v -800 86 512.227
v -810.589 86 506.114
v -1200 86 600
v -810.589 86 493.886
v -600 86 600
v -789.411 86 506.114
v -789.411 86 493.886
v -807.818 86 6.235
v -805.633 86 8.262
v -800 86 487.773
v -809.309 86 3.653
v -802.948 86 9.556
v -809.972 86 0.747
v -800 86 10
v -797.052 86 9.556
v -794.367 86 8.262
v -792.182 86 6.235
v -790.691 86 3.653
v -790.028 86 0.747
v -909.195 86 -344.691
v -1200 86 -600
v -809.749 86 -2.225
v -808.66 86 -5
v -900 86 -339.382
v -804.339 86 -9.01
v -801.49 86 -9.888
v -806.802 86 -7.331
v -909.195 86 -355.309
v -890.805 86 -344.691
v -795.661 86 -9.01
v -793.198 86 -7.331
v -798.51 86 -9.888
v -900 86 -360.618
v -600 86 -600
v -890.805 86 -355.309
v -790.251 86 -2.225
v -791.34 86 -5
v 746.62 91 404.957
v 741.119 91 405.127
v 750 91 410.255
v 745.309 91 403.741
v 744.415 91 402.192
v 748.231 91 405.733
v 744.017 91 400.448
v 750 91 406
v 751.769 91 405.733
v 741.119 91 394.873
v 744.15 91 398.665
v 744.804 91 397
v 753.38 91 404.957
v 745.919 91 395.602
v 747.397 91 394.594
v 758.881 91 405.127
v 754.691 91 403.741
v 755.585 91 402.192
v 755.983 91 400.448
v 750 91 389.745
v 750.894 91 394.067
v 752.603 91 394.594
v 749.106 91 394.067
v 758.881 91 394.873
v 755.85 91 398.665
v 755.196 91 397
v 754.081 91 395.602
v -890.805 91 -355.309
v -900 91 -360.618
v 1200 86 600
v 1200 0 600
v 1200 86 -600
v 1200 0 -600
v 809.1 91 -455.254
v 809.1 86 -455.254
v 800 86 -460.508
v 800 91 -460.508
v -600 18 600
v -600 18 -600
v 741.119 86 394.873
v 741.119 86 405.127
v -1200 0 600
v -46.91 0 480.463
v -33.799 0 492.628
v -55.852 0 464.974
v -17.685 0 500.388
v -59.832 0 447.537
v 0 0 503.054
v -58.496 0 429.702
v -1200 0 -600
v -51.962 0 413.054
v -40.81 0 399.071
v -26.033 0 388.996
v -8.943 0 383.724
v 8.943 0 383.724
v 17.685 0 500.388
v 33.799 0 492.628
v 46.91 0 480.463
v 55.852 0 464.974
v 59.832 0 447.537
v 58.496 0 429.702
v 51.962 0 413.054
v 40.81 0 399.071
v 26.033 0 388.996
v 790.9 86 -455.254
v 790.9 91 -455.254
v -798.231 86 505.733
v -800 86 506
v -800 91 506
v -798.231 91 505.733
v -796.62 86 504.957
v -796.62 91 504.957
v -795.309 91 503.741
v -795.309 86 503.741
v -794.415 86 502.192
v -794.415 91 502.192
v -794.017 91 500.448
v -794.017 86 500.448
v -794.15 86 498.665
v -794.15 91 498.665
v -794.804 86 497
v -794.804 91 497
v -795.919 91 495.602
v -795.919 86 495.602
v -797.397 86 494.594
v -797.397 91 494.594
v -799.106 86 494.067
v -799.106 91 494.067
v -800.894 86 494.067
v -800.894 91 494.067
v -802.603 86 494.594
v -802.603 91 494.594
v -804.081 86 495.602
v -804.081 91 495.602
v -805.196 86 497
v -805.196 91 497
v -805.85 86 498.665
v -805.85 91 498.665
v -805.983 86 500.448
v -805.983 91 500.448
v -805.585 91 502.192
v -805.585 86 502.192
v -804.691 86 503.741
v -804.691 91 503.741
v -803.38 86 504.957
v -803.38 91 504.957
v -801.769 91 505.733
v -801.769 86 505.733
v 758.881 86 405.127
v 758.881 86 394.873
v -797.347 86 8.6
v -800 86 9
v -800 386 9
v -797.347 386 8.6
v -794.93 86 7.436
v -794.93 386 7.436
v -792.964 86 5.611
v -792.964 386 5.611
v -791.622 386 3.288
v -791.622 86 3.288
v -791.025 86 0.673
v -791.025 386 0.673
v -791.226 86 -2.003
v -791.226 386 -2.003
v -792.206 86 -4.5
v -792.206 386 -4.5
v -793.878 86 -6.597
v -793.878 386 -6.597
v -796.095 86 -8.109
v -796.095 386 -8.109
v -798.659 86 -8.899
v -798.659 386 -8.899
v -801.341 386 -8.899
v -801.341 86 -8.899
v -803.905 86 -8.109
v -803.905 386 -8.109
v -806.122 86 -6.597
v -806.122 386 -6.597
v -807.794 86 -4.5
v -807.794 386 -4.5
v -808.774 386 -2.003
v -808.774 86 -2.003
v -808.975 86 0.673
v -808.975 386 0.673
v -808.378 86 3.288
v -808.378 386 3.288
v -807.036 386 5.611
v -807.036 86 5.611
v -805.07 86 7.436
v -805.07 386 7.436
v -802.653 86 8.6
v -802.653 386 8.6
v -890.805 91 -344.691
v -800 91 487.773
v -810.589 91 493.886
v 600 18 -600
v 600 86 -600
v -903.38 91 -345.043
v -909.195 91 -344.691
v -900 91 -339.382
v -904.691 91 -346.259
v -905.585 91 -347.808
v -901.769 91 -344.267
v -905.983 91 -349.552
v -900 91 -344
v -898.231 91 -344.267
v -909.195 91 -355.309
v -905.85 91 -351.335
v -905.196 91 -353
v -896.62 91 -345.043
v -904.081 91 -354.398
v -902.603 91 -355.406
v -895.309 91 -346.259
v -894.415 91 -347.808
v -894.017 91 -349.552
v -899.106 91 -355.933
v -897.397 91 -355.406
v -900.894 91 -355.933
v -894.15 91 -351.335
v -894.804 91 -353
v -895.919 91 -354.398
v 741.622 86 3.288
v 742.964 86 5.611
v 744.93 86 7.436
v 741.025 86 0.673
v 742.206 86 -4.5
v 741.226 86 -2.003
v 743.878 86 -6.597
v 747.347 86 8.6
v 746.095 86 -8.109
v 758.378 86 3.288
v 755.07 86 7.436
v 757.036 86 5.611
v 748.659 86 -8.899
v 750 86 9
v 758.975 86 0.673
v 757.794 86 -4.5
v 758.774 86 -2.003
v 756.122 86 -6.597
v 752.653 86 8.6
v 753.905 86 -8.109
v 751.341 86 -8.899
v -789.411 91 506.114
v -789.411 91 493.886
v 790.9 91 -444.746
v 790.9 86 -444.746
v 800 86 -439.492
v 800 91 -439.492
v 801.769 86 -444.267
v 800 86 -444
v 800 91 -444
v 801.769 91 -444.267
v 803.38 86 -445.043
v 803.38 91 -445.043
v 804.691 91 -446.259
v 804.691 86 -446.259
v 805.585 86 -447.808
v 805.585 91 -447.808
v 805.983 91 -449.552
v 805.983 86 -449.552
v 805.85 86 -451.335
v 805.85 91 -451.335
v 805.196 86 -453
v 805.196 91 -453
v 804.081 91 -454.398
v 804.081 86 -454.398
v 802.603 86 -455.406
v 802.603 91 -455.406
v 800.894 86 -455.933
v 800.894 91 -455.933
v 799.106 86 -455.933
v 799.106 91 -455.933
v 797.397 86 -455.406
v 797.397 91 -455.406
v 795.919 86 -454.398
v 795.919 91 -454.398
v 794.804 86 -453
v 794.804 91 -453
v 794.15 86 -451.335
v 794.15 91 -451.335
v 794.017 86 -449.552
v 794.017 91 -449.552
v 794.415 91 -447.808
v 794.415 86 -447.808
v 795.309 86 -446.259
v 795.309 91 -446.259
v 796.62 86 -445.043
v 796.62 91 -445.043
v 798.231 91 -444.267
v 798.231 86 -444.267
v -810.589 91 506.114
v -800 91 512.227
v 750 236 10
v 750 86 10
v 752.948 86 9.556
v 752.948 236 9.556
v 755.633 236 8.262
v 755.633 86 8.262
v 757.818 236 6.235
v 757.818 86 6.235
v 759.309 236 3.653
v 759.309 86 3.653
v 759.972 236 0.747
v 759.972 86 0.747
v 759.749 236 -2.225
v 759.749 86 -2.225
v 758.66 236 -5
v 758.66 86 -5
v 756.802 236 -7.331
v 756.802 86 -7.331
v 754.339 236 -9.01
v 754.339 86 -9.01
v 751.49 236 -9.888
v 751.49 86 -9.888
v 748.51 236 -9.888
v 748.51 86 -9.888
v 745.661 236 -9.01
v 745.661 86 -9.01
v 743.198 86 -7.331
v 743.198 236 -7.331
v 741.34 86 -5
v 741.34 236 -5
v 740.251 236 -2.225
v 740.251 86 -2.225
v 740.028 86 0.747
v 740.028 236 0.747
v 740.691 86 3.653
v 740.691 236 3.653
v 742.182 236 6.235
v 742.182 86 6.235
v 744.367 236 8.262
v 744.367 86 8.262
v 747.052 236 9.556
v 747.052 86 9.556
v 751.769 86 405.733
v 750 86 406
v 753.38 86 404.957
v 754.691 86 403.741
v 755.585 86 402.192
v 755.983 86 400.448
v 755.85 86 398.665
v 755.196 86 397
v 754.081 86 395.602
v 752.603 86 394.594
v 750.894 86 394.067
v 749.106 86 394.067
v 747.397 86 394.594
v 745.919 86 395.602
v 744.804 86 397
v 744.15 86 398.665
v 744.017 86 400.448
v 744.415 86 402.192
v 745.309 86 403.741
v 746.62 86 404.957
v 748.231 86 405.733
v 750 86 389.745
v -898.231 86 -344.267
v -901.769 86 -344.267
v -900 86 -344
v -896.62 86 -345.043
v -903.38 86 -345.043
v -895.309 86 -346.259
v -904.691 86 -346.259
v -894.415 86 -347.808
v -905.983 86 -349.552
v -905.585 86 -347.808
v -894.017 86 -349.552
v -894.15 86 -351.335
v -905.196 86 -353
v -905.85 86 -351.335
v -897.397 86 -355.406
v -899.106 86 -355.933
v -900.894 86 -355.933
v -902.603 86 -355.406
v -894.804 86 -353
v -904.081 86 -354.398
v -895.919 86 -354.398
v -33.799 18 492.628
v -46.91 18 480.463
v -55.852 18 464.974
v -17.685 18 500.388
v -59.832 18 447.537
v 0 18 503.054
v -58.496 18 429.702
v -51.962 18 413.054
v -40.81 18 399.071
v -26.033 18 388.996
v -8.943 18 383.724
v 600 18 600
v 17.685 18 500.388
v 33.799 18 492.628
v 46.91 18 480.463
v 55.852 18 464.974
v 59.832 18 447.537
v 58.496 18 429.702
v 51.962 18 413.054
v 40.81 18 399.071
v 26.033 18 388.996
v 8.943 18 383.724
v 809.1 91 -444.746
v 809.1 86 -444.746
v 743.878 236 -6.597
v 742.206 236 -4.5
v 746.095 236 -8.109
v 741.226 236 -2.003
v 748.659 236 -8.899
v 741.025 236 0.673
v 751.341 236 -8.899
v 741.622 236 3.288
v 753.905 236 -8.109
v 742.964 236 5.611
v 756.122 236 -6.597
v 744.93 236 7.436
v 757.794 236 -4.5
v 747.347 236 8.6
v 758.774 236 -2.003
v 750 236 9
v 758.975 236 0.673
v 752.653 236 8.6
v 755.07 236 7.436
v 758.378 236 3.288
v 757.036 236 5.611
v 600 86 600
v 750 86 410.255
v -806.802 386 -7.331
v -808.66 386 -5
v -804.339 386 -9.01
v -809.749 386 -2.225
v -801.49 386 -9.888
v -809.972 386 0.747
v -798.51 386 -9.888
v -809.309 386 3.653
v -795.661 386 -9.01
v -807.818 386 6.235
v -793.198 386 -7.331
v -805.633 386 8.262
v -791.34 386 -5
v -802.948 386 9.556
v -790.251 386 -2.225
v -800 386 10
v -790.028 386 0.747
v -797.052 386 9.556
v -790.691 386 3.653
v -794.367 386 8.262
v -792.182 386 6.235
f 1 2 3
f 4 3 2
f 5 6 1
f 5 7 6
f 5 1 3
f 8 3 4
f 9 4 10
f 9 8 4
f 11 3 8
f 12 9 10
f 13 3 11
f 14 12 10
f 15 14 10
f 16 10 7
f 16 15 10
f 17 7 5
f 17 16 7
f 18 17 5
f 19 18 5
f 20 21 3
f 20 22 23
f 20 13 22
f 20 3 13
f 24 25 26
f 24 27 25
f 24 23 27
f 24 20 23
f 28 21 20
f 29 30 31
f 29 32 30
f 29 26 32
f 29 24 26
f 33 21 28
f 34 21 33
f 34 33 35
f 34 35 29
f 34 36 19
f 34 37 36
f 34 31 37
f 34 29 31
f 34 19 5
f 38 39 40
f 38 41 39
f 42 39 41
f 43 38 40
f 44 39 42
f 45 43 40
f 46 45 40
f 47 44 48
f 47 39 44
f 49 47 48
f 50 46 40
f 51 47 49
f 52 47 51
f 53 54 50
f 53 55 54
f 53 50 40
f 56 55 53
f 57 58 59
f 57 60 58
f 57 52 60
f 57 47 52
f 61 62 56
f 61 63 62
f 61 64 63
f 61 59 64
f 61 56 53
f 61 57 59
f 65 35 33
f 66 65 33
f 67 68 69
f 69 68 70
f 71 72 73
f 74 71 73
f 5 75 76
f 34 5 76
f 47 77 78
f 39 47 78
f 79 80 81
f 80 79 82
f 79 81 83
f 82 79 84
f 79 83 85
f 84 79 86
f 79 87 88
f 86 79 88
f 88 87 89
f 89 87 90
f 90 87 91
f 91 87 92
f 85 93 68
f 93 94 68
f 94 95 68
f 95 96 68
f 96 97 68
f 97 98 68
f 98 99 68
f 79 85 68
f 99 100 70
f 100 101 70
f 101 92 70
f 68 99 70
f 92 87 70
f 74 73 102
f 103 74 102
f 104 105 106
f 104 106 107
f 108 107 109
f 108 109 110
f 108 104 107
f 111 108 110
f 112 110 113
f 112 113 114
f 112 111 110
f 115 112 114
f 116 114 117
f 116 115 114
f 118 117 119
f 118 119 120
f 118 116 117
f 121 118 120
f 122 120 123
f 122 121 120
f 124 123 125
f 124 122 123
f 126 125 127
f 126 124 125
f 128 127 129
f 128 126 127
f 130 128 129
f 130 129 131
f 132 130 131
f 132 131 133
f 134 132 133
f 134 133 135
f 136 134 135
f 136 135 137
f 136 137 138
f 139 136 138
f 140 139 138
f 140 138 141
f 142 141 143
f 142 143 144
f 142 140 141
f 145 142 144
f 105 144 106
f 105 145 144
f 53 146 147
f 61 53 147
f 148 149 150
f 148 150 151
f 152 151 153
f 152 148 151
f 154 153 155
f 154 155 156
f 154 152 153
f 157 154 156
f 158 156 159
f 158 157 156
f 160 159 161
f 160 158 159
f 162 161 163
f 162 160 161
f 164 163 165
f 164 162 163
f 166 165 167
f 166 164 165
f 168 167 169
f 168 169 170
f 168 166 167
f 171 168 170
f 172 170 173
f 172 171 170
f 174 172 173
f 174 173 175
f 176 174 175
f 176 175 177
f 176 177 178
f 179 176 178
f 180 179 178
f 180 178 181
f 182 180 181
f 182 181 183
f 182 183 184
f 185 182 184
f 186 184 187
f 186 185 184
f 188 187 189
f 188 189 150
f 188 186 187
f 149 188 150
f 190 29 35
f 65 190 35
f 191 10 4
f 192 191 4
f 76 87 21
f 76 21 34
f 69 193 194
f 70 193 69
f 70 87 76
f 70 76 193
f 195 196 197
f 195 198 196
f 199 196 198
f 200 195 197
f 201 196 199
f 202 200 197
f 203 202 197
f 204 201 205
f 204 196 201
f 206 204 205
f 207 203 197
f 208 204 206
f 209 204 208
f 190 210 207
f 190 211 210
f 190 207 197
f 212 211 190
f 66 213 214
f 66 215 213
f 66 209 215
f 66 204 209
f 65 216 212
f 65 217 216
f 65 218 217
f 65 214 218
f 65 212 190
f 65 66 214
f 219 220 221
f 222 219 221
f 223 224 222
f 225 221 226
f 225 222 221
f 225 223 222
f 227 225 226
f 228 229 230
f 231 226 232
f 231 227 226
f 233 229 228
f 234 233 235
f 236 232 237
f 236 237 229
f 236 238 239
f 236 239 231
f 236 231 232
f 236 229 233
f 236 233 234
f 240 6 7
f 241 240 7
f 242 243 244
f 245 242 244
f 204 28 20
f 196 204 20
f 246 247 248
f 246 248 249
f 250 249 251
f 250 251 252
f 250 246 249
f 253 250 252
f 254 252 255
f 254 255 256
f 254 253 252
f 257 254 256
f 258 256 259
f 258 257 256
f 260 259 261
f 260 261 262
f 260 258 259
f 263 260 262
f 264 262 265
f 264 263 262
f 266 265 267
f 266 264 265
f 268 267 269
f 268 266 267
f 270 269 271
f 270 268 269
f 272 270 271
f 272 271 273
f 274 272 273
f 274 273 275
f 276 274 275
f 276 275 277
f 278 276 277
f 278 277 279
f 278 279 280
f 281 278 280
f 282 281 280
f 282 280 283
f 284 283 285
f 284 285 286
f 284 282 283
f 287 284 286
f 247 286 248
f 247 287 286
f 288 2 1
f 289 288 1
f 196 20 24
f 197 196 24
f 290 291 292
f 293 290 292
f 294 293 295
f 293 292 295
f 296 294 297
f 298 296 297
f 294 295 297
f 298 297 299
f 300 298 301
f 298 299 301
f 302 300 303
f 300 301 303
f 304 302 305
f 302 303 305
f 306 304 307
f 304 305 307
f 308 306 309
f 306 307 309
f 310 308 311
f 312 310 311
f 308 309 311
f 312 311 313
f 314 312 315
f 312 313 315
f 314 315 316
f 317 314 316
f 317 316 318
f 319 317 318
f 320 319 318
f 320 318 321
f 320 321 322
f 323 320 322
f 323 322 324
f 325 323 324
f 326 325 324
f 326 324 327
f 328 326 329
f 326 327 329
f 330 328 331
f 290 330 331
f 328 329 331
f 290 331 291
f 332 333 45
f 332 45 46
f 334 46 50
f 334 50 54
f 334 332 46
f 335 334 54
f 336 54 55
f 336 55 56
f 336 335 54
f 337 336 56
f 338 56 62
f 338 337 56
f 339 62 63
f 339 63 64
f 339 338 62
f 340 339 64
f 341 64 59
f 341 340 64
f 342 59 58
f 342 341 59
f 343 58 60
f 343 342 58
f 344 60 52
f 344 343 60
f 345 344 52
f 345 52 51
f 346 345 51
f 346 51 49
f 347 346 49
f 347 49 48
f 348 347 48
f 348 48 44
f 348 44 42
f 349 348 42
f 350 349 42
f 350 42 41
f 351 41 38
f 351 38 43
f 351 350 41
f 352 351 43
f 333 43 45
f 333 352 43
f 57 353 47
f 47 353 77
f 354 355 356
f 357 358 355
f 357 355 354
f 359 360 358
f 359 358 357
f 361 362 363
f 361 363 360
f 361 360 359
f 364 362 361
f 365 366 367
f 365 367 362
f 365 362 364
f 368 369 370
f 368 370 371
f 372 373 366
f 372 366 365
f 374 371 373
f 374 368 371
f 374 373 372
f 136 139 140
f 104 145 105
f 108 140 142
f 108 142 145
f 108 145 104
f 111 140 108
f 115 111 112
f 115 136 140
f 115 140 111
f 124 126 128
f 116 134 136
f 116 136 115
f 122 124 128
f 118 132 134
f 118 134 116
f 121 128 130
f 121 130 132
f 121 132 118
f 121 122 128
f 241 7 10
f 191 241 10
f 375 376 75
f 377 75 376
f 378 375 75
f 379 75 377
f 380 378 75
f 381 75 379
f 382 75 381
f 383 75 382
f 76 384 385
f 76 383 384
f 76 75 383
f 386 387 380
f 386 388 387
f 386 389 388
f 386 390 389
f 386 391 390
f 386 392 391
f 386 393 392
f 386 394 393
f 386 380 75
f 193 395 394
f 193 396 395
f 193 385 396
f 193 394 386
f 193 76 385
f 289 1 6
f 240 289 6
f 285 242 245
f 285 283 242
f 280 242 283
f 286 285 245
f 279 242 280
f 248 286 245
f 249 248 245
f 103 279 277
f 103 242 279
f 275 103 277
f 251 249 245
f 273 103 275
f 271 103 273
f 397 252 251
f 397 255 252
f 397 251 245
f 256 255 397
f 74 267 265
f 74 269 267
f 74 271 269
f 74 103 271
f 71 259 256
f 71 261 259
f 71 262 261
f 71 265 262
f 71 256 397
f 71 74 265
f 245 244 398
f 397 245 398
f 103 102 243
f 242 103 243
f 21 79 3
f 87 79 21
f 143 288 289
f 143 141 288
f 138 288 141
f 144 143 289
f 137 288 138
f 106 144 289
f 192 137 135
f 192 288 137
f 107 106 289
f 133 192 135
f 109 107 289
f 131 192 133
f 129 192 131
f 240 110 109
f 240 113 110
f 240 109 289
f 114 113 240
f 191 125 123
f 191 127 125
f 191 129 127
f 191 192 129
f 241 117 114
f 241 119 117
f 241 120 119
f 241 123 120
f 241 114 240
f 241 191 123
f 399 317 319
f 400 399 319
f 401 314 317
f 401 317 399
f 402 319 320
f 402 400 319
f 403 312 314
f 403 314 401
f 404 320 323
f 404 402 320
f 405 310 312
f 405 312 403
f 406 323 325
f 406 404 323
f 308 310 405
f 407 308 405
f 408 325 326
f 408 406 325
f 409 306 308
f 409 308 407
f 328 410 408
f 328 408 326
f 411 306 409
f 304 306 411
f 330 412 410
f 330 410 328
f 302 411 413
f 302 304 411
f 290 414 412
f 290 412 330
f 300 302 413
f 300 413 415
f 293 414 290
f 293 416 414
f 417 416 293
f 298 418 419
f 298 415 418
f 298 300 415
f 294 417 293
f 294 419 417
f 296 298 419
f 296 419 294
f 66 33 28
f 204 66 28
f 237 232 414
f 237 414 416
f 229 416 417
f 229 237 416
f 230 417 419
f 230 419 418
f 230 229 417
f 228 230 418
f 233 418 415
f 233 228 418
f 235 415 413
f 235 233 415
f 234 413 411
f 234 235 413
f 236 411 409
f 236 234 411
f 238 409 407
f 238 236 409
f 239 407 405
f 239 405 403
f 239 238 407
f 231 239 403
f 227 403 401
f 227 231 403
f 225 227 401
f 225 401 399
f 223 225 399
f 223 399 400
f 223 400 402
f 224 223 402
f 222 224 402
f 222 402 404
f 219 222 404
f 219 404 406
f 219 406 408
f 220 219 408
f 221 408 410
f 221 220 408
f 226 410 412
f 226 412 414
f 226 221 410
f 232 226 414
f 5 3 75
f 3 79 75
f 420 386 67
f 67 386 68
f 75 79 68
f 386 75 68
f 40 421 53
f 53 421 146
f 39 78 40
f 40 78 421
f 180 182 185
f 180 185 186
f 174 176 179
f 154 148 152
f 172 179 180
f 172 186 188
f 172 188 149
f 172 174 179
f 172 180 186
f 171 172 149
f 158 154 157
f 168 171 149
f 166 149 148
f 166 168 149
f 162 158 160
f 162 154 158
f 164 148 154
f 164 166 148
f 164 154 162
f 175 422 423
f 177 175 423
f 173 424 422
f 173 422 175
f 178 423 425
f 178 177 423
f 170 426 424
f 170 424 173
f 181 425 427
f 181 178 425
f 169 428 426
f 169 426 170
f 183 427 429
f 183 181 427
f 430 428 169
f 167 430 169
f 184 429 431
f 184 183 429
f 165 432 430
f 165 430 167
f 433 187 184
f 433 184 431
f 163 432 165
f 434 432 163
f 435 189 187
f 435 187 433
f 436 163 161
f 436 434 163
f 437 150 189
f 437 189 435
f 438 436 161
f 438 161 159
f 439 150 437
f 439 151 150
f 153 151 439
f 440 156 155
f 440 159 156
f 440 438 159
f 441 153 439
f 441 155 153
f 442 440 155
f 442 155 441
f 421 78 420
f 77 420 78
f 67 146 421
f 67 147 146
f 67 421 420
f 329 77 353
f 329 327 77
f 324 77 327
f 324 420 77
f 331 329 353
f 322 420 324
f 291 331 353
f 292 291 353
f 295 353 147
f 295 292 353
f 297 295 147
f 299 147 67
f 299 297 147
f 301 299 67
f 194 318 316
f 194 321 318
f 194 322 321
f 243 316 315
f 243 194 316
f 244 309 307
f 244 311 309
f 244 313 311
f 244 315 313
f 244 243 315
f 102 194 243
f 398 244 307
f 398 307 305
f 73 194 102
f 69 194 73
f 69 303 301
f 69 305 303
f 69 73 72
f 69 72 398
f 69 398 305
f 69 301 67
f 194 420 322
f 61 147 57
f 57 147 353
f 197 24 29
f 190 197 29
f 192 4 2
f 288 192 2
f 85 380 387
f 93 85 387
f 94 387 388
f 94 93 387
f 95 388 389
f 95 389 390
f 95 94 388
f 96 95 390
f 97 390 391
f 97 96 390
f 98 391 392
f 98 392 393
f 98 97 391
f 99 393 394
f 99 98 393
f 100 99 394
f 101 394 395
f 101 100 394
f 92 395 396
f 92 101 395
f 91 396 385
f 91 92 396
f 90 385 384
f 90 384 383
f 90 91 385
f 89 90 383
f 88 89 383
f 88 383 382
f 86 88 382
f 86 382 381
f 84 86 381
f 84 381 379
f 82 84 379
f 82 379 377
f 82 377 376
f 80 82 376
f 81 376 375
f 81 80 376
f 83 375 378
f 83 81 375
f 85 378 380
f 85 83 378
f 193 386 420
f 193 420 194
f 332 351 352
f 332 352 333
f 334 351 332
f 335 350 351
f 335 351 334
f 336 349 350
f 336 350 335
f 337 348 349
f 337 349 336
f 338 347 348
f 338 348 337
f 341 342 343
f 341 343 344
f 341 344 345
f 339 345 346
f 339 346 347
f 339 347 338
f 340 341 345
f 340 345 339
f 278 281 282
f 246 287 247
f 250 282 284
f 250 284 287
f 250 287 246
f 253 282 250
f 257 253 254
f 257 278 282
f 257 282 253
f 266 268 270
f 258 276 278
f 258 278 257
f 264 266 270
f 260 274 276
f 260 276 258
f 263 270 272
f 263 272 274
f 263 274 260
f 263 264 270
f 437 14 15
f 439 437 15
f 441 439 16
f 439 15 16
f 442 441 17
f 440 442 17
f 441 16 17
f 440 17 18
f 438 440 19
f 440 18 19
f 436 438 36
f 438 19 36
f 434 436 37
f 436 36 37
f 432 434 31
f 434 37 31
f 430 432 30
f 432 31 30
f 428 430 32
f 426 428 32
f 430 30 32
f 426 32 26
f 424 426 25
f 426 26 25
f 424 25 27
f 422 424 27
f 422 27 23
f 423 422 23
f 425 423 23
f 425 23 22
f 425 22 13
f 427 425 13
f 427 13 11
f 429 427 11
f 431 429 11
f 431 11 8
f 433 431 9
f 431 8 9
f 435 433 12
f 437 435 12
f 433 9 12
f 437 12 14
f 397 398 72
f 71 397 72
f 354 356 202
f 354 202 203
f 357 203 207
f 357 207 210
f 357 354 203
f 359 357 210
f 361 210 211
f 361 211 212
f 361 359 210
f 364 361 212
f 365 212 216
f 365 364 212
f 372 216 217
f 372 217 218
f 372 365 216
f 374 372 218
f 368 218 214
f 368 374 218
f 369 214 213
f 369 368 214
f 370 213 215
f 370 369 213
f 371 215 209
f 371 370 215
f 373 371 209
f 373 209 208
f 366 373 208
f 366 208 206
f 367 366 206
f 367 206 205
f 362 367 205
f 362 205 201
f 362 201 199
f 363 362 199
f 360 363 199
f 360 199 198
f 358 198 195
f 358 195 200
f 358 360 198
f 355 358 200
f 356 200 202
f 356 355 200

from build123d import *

# Parameters (mm, degrees)
SKETCH1_W           = 2400
SKETCH1_H           = 1200
SKETCH1_R           = 60
BOSS_EXTRUDE1_DEPTH = 18
BOSS_EXTRUDE2_START = 18
SKETCH2_W           = 600
SKETCH2_H           = 1200
BOSS_EXTRUDE2_DEPTH = 68
SKETCH3_R           = 10
SKETCH3_R_2         = 9
BOSS_EXTRUDE3_DEPTH = 300
SKETCH4_R           = 10
SKETCH4_R_2         = 9
BOSS_EXTRUDE4_DEPTH = 150
SKETCH6_R           = 6
BOSS_EXTRUDE5_DEPTH = 5
SKETCH7_R           = 6
BOSS_EXTRUDE6_DEPTH = 5


with BuildPart() as part:
    # Sketch1 → Boss-Extrude1 (new body)
    with BuildSketch(Plane(origin=(0, 0, 0), x_dir=(1, 0, 0), z_dir=(0, 1, 0))):
        Rectangle(SKETCH1_W, SKETCH1_H)
        with Locations(Location((0, -443.053648657, 0), (0, 0, 270))):
            Circle(SKETCH1_R, mode=Mode.SUBTRACT)
    extrude(amount=BOSS_EXTRUDE1_DEPTH)

    # Sketch2 → Boss-Extrude2 (add)
    with BuildSketch(Plane(origin=(0, 0, 0), x_dir=(1, 0, 0), z_dir=(0, 1, 0)).offset(BOSS_EXTRUDE2_START)):
        with Locations((-900, 0)):
            Rectangle(SKETCH2_W, SKETCH2_H)
        with Locations((900, 0)):
            Rectangle(SKETCH2_W, SKETCH2_H)
    extrude(amount=BOSS_EXTRUDE2_DEPTH)

    # Sketch3 → Boss-Extrude3 (add)
    with BuildSketch(Plane(origin=(0, 86, 0), x_dir=(1, 0, 0), z_dir=(0, 1, 0))):
        with Locations(Location((-800, 0, 0), (0, 0, 270))):
            Circle(SKETCH3_R)
        with Locations(Location((-800, 0, 0), (0, 0, 270))):
            Circle(SKETCH3_R_2, mode=Mode.SUBTRACT)
    extrude(amount=BOSS_EXTRUDE3_DEPTH)

    # Sketch4 → Boss-Extrude4 (add)
    with BuildSketch(Plane(origin=(0, 86, 0), x_dir=(1, 0, 0), z_dir=(0, 1, 0))):
        with Locations(Location((750, 0, 0), (0, 0, 270))):
            Circle(SKETCH4_R)
        with Locations(Location((750, 0, 0), (0, 0, 270))):
            Circle(SKETCH4_R_2, mode=Mode.SUBTRACT)
    extrude(amount=BOSS_EXTRUDE4_DEPTH)

    # Sketch6 → Boss-Extrude5 (add)
    # profile 1 of 2: a face of its own
    with BuildSketch(Plane(origin=(0, 86, 0), x_dir=(1, 0, 0), z_dir=(0, 1, 0))):
        Polygon((-800, -512.227333668), (-789.410818423, -506.113666834), (-789.410818423, -493.886333166), (-800, -487.772666332), (-810.589181577, -493.886333166), (-810.589181577, -506.113666834), align=None)
        with Locations(Location((-800, -500, 0), (0, 0, 270))):
            Circle(SKETCH6_R, mode=Mode.SUBTRACT)
    # profile 2 of 2: a face of its own
    with BuildSketch(Plane(origin=(0, 86, 0), x_dir=(1, 0, 0), z_dir=(0, 1, 0))):
        Polygon((-900, 360.617779526), (-909.195266801, 355.308889763), (-909.195266801, 344.691110237), (-900, 339.382220474), (-890.804733199, 344.691110237), (-890.804733199, 355.308889763), align=None)
        with Locations(Location((-900, 350, 0), (0, 0, 270))):
            Circle(SKETCH6_R, mode=Mode.SUBTRACT)
    extrude(amount=BOSS_EXTRUDE5_DEPTH)

    # Sketch7 → Boss-Extrude6 (add)
    # profile 1 of 2: a face of its own
    with BuildSketch(Plane(origin=(0, 86, 0), x_dir=(1, 0, 0), z_dir=(0, 1, 0))):
        Polygon((750, -410.254981665), (758.881074637, -405.127490833), (758.881074637, -394.872509167), (750, -389.745018335), (741.118925363, -394.872509167), (741.118925363, -405.127490833), align=None)
        with Locations(Location((750, -400, 0), (0, 0, 270))):
            Circle(SKETCH7_R, mode=Mode.SUBTRACT)
    # profile 2 of 2: a face of its own
    with BuildSketch(Plane(origin=(0, 86, 0), x_dir=(1, 0, 0), z_dir=(0, 1, 0))):
        Polygon((800, 460.50831519), (790.899532094, 455.254157595), (790.899532094, 444.745842405), (800, 439.49168481), (809.100467906, 444.745842405), (809.100467906, 455.254157595), align=None)
        with Locations(Location((800, 450, 0), (0, 0, 270))):
            Circle(SKETCH7_R, mode=Mode.SUBTRACT)
    extrude(amount=BOSS_EXTRUDE6_DEPTH)


solid = part.part
